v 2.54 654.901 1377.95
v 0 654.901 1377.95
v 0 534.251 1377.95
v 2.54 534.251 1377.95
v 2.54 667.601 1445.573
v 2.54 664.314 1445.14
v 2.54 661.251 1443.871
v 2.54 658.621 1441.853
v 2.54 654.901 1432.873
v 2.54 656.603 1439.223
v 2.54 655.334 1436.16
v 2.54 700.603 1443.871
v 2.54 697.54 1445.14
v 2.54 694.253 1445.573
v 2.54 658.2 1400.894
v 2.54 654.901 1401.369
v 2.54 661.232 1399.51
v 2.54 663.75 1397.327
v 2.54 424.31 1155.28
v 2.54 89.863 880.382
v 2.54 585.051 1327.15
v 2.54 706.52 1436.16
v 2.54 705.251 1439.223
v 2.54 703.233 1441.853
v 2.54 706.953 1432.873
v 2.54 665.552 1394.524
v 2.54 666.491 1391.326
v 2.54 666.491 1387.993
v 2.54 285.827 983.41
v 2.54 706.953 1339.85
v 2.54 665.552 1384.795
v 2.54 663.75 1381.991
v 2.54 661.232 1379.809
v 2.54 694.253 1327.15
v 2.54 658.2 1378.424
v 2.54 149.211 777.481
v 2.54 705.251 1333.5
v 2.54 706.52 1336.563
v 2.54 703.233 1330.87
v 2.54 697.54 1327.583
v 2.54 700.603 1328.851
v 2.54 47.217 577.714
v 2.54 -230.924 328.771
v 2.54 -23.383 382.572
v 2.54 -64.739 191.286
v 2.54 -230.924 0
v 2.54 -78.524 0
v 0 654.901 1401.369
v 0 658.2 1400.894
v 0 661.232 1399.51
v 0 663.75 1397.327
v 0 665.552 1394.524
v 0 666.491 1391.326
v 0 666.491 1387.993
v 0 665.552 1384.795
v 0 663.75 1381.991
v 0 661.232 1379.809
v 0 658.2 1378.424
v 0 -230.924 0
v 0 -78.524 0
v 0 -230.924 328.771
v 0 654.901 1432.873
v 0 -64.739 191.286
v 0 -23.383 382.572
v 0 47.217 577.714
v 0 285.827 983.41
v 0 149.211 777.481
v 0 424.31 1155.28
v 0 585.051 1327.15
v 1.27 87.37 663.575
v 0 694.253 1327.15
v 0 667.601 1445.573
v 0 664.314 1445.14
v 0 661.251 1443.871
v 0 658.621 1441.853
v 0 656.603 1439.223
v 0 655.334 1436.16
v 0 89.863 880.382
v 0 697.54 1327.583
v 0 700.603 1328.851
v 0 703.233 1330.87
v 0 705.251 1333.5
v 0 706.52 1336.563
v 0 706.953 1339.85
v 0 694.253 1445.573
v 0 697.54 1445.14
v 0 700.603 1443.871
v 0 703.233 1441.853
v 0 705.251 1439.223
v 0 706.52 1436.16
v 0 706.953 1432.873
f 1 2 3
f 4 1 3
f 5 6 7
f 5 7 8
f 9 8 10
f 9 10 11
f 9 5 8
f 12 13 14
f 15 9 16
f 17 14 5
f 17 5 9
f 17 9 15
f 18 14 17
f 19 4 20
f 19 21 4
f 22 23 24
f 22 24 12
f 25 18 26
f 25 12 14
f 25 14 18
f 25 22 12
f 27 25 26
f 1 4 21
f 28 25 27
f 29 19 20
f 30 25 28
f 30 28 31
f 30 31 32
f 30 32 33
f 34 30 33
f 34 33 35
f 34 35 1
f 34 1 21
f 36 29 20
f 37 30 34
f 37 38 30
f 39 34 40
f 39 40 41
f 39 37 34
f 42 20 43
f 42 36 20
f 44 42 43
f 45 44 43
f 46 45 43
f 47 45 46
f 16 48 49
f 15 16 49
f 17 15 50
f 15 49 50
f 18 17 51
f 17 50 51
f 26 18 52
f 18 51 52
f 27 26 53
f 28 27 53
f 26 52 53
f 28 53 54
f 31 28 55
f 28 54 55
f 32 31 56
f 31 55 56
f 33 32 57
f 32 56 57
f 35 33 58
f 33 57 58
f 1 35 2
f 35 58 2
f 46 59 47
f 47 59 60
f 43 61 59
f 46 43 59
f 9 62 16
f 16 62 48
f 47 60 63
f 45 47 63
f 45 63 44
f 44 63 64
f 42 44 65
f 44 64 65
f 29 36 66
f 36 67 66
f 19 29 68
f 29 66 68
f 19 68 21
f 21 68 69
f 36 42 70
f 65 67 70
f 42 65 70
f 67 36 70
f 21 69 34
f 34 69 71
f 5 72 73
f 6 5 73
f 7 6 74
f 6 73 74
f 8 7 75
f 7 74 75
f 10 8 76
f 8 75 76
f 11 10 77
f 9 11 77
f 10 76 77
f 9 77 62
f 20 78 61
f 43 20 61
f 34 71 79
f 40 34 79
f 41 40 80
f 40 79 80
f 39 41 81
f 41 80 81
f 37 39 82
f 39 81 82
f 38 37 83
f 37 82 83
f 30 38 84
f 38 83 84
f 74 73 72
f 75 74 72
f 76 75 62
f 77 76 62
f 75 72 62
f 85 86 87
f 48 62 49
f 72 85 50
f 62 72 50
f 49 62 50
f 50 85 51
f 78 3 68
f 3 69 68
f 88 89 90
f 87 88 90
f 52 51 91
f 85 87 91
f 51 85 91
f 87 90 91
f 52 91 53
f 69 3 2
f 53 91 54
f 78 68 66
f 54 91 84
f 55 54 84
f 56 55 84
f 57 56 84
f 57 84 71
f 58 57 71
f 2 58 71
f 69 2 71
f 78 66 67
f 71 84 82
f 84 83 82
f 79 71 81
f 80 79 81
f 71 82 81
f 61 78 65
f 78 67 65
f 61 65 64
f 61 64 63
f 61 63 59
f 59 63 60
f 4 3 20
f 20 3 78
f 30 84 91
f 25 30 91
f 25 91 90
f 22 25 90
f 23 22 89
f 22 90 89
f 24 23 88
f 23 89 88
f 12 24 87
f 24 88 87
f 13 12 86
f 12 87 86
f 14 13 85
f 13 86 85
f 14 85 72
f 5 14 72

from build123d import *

# Parameters (mm, degrees)
BOSS_EXTRUDE3_DEPTH = 2.54


with BuildPart() as part:
    # Sketch1 → Boss-Extrude3 (new body)
    with BuildSketch(Plane(origin=(0, 0, 0), x_dir=(0, 0, -1), z_dir=(1, 0, 0))):
        with BuildLine():
            Line((-328.770779224, -230.923937708), (-1.3867e-05, -230.923937708))
            Line((-1.3867e-05, -230.923937708), (-1.3866e-05, -78.523920986))
            add(Edge.make_bspline(
                [(-1.3866e-05, -78.523920986), (-663.575061276, -78.523963202), (-1327.150157835, 585.051089401)],
                knots=[0, 0, 0, 1, 1, 1], degree=2))
            Line((-1327.150157835, 585.051089401), (-1327.149864381, 694.252697447))
            ThreePointArc((-1327.149864381, 694.252697447), (-1330.869609261, 703.232955586), (-1339.849867516, 706.952700185))
            Line((-1339.849867516, 706.952700185), (-1432.872655994, 706.952698728))
            ThreePointArc((-1432.872655994, 706.952698728), (-1441.852912057, 703.232954709), (-1445.572655795, 694.25269853))
            Line((-1445.572655795, 694.25269853), (-1445.572655378, 667.601090483))
            ThreePointArc((-1445.572655378, 667.601090483), (-1441.852911359, 658.620834421), (-1432.872655179, 654.901090682))
            Line((-1432.872655179, 654.901090682), (-1401.368674128, 654.901091175))
            ThreePointArc((-1401.368674128, 654.901091175), (-1389.659272694, 666.610488308), (-1377.949874128, 654.901088308))
            Line((-1377.949874128, 654.901088308), (-1377.949874128, 534.251091161))
            Line((-1377.949874128, 534.251091161), (-880.381692198, 89.86268528))
            Line((-880.381692198, 89.86268528), (-328.770779224, -230.923937708))
        make_face()
    extrude(amount=BOSS_EXTRUDE3_DEPTH)


solid = part.part
